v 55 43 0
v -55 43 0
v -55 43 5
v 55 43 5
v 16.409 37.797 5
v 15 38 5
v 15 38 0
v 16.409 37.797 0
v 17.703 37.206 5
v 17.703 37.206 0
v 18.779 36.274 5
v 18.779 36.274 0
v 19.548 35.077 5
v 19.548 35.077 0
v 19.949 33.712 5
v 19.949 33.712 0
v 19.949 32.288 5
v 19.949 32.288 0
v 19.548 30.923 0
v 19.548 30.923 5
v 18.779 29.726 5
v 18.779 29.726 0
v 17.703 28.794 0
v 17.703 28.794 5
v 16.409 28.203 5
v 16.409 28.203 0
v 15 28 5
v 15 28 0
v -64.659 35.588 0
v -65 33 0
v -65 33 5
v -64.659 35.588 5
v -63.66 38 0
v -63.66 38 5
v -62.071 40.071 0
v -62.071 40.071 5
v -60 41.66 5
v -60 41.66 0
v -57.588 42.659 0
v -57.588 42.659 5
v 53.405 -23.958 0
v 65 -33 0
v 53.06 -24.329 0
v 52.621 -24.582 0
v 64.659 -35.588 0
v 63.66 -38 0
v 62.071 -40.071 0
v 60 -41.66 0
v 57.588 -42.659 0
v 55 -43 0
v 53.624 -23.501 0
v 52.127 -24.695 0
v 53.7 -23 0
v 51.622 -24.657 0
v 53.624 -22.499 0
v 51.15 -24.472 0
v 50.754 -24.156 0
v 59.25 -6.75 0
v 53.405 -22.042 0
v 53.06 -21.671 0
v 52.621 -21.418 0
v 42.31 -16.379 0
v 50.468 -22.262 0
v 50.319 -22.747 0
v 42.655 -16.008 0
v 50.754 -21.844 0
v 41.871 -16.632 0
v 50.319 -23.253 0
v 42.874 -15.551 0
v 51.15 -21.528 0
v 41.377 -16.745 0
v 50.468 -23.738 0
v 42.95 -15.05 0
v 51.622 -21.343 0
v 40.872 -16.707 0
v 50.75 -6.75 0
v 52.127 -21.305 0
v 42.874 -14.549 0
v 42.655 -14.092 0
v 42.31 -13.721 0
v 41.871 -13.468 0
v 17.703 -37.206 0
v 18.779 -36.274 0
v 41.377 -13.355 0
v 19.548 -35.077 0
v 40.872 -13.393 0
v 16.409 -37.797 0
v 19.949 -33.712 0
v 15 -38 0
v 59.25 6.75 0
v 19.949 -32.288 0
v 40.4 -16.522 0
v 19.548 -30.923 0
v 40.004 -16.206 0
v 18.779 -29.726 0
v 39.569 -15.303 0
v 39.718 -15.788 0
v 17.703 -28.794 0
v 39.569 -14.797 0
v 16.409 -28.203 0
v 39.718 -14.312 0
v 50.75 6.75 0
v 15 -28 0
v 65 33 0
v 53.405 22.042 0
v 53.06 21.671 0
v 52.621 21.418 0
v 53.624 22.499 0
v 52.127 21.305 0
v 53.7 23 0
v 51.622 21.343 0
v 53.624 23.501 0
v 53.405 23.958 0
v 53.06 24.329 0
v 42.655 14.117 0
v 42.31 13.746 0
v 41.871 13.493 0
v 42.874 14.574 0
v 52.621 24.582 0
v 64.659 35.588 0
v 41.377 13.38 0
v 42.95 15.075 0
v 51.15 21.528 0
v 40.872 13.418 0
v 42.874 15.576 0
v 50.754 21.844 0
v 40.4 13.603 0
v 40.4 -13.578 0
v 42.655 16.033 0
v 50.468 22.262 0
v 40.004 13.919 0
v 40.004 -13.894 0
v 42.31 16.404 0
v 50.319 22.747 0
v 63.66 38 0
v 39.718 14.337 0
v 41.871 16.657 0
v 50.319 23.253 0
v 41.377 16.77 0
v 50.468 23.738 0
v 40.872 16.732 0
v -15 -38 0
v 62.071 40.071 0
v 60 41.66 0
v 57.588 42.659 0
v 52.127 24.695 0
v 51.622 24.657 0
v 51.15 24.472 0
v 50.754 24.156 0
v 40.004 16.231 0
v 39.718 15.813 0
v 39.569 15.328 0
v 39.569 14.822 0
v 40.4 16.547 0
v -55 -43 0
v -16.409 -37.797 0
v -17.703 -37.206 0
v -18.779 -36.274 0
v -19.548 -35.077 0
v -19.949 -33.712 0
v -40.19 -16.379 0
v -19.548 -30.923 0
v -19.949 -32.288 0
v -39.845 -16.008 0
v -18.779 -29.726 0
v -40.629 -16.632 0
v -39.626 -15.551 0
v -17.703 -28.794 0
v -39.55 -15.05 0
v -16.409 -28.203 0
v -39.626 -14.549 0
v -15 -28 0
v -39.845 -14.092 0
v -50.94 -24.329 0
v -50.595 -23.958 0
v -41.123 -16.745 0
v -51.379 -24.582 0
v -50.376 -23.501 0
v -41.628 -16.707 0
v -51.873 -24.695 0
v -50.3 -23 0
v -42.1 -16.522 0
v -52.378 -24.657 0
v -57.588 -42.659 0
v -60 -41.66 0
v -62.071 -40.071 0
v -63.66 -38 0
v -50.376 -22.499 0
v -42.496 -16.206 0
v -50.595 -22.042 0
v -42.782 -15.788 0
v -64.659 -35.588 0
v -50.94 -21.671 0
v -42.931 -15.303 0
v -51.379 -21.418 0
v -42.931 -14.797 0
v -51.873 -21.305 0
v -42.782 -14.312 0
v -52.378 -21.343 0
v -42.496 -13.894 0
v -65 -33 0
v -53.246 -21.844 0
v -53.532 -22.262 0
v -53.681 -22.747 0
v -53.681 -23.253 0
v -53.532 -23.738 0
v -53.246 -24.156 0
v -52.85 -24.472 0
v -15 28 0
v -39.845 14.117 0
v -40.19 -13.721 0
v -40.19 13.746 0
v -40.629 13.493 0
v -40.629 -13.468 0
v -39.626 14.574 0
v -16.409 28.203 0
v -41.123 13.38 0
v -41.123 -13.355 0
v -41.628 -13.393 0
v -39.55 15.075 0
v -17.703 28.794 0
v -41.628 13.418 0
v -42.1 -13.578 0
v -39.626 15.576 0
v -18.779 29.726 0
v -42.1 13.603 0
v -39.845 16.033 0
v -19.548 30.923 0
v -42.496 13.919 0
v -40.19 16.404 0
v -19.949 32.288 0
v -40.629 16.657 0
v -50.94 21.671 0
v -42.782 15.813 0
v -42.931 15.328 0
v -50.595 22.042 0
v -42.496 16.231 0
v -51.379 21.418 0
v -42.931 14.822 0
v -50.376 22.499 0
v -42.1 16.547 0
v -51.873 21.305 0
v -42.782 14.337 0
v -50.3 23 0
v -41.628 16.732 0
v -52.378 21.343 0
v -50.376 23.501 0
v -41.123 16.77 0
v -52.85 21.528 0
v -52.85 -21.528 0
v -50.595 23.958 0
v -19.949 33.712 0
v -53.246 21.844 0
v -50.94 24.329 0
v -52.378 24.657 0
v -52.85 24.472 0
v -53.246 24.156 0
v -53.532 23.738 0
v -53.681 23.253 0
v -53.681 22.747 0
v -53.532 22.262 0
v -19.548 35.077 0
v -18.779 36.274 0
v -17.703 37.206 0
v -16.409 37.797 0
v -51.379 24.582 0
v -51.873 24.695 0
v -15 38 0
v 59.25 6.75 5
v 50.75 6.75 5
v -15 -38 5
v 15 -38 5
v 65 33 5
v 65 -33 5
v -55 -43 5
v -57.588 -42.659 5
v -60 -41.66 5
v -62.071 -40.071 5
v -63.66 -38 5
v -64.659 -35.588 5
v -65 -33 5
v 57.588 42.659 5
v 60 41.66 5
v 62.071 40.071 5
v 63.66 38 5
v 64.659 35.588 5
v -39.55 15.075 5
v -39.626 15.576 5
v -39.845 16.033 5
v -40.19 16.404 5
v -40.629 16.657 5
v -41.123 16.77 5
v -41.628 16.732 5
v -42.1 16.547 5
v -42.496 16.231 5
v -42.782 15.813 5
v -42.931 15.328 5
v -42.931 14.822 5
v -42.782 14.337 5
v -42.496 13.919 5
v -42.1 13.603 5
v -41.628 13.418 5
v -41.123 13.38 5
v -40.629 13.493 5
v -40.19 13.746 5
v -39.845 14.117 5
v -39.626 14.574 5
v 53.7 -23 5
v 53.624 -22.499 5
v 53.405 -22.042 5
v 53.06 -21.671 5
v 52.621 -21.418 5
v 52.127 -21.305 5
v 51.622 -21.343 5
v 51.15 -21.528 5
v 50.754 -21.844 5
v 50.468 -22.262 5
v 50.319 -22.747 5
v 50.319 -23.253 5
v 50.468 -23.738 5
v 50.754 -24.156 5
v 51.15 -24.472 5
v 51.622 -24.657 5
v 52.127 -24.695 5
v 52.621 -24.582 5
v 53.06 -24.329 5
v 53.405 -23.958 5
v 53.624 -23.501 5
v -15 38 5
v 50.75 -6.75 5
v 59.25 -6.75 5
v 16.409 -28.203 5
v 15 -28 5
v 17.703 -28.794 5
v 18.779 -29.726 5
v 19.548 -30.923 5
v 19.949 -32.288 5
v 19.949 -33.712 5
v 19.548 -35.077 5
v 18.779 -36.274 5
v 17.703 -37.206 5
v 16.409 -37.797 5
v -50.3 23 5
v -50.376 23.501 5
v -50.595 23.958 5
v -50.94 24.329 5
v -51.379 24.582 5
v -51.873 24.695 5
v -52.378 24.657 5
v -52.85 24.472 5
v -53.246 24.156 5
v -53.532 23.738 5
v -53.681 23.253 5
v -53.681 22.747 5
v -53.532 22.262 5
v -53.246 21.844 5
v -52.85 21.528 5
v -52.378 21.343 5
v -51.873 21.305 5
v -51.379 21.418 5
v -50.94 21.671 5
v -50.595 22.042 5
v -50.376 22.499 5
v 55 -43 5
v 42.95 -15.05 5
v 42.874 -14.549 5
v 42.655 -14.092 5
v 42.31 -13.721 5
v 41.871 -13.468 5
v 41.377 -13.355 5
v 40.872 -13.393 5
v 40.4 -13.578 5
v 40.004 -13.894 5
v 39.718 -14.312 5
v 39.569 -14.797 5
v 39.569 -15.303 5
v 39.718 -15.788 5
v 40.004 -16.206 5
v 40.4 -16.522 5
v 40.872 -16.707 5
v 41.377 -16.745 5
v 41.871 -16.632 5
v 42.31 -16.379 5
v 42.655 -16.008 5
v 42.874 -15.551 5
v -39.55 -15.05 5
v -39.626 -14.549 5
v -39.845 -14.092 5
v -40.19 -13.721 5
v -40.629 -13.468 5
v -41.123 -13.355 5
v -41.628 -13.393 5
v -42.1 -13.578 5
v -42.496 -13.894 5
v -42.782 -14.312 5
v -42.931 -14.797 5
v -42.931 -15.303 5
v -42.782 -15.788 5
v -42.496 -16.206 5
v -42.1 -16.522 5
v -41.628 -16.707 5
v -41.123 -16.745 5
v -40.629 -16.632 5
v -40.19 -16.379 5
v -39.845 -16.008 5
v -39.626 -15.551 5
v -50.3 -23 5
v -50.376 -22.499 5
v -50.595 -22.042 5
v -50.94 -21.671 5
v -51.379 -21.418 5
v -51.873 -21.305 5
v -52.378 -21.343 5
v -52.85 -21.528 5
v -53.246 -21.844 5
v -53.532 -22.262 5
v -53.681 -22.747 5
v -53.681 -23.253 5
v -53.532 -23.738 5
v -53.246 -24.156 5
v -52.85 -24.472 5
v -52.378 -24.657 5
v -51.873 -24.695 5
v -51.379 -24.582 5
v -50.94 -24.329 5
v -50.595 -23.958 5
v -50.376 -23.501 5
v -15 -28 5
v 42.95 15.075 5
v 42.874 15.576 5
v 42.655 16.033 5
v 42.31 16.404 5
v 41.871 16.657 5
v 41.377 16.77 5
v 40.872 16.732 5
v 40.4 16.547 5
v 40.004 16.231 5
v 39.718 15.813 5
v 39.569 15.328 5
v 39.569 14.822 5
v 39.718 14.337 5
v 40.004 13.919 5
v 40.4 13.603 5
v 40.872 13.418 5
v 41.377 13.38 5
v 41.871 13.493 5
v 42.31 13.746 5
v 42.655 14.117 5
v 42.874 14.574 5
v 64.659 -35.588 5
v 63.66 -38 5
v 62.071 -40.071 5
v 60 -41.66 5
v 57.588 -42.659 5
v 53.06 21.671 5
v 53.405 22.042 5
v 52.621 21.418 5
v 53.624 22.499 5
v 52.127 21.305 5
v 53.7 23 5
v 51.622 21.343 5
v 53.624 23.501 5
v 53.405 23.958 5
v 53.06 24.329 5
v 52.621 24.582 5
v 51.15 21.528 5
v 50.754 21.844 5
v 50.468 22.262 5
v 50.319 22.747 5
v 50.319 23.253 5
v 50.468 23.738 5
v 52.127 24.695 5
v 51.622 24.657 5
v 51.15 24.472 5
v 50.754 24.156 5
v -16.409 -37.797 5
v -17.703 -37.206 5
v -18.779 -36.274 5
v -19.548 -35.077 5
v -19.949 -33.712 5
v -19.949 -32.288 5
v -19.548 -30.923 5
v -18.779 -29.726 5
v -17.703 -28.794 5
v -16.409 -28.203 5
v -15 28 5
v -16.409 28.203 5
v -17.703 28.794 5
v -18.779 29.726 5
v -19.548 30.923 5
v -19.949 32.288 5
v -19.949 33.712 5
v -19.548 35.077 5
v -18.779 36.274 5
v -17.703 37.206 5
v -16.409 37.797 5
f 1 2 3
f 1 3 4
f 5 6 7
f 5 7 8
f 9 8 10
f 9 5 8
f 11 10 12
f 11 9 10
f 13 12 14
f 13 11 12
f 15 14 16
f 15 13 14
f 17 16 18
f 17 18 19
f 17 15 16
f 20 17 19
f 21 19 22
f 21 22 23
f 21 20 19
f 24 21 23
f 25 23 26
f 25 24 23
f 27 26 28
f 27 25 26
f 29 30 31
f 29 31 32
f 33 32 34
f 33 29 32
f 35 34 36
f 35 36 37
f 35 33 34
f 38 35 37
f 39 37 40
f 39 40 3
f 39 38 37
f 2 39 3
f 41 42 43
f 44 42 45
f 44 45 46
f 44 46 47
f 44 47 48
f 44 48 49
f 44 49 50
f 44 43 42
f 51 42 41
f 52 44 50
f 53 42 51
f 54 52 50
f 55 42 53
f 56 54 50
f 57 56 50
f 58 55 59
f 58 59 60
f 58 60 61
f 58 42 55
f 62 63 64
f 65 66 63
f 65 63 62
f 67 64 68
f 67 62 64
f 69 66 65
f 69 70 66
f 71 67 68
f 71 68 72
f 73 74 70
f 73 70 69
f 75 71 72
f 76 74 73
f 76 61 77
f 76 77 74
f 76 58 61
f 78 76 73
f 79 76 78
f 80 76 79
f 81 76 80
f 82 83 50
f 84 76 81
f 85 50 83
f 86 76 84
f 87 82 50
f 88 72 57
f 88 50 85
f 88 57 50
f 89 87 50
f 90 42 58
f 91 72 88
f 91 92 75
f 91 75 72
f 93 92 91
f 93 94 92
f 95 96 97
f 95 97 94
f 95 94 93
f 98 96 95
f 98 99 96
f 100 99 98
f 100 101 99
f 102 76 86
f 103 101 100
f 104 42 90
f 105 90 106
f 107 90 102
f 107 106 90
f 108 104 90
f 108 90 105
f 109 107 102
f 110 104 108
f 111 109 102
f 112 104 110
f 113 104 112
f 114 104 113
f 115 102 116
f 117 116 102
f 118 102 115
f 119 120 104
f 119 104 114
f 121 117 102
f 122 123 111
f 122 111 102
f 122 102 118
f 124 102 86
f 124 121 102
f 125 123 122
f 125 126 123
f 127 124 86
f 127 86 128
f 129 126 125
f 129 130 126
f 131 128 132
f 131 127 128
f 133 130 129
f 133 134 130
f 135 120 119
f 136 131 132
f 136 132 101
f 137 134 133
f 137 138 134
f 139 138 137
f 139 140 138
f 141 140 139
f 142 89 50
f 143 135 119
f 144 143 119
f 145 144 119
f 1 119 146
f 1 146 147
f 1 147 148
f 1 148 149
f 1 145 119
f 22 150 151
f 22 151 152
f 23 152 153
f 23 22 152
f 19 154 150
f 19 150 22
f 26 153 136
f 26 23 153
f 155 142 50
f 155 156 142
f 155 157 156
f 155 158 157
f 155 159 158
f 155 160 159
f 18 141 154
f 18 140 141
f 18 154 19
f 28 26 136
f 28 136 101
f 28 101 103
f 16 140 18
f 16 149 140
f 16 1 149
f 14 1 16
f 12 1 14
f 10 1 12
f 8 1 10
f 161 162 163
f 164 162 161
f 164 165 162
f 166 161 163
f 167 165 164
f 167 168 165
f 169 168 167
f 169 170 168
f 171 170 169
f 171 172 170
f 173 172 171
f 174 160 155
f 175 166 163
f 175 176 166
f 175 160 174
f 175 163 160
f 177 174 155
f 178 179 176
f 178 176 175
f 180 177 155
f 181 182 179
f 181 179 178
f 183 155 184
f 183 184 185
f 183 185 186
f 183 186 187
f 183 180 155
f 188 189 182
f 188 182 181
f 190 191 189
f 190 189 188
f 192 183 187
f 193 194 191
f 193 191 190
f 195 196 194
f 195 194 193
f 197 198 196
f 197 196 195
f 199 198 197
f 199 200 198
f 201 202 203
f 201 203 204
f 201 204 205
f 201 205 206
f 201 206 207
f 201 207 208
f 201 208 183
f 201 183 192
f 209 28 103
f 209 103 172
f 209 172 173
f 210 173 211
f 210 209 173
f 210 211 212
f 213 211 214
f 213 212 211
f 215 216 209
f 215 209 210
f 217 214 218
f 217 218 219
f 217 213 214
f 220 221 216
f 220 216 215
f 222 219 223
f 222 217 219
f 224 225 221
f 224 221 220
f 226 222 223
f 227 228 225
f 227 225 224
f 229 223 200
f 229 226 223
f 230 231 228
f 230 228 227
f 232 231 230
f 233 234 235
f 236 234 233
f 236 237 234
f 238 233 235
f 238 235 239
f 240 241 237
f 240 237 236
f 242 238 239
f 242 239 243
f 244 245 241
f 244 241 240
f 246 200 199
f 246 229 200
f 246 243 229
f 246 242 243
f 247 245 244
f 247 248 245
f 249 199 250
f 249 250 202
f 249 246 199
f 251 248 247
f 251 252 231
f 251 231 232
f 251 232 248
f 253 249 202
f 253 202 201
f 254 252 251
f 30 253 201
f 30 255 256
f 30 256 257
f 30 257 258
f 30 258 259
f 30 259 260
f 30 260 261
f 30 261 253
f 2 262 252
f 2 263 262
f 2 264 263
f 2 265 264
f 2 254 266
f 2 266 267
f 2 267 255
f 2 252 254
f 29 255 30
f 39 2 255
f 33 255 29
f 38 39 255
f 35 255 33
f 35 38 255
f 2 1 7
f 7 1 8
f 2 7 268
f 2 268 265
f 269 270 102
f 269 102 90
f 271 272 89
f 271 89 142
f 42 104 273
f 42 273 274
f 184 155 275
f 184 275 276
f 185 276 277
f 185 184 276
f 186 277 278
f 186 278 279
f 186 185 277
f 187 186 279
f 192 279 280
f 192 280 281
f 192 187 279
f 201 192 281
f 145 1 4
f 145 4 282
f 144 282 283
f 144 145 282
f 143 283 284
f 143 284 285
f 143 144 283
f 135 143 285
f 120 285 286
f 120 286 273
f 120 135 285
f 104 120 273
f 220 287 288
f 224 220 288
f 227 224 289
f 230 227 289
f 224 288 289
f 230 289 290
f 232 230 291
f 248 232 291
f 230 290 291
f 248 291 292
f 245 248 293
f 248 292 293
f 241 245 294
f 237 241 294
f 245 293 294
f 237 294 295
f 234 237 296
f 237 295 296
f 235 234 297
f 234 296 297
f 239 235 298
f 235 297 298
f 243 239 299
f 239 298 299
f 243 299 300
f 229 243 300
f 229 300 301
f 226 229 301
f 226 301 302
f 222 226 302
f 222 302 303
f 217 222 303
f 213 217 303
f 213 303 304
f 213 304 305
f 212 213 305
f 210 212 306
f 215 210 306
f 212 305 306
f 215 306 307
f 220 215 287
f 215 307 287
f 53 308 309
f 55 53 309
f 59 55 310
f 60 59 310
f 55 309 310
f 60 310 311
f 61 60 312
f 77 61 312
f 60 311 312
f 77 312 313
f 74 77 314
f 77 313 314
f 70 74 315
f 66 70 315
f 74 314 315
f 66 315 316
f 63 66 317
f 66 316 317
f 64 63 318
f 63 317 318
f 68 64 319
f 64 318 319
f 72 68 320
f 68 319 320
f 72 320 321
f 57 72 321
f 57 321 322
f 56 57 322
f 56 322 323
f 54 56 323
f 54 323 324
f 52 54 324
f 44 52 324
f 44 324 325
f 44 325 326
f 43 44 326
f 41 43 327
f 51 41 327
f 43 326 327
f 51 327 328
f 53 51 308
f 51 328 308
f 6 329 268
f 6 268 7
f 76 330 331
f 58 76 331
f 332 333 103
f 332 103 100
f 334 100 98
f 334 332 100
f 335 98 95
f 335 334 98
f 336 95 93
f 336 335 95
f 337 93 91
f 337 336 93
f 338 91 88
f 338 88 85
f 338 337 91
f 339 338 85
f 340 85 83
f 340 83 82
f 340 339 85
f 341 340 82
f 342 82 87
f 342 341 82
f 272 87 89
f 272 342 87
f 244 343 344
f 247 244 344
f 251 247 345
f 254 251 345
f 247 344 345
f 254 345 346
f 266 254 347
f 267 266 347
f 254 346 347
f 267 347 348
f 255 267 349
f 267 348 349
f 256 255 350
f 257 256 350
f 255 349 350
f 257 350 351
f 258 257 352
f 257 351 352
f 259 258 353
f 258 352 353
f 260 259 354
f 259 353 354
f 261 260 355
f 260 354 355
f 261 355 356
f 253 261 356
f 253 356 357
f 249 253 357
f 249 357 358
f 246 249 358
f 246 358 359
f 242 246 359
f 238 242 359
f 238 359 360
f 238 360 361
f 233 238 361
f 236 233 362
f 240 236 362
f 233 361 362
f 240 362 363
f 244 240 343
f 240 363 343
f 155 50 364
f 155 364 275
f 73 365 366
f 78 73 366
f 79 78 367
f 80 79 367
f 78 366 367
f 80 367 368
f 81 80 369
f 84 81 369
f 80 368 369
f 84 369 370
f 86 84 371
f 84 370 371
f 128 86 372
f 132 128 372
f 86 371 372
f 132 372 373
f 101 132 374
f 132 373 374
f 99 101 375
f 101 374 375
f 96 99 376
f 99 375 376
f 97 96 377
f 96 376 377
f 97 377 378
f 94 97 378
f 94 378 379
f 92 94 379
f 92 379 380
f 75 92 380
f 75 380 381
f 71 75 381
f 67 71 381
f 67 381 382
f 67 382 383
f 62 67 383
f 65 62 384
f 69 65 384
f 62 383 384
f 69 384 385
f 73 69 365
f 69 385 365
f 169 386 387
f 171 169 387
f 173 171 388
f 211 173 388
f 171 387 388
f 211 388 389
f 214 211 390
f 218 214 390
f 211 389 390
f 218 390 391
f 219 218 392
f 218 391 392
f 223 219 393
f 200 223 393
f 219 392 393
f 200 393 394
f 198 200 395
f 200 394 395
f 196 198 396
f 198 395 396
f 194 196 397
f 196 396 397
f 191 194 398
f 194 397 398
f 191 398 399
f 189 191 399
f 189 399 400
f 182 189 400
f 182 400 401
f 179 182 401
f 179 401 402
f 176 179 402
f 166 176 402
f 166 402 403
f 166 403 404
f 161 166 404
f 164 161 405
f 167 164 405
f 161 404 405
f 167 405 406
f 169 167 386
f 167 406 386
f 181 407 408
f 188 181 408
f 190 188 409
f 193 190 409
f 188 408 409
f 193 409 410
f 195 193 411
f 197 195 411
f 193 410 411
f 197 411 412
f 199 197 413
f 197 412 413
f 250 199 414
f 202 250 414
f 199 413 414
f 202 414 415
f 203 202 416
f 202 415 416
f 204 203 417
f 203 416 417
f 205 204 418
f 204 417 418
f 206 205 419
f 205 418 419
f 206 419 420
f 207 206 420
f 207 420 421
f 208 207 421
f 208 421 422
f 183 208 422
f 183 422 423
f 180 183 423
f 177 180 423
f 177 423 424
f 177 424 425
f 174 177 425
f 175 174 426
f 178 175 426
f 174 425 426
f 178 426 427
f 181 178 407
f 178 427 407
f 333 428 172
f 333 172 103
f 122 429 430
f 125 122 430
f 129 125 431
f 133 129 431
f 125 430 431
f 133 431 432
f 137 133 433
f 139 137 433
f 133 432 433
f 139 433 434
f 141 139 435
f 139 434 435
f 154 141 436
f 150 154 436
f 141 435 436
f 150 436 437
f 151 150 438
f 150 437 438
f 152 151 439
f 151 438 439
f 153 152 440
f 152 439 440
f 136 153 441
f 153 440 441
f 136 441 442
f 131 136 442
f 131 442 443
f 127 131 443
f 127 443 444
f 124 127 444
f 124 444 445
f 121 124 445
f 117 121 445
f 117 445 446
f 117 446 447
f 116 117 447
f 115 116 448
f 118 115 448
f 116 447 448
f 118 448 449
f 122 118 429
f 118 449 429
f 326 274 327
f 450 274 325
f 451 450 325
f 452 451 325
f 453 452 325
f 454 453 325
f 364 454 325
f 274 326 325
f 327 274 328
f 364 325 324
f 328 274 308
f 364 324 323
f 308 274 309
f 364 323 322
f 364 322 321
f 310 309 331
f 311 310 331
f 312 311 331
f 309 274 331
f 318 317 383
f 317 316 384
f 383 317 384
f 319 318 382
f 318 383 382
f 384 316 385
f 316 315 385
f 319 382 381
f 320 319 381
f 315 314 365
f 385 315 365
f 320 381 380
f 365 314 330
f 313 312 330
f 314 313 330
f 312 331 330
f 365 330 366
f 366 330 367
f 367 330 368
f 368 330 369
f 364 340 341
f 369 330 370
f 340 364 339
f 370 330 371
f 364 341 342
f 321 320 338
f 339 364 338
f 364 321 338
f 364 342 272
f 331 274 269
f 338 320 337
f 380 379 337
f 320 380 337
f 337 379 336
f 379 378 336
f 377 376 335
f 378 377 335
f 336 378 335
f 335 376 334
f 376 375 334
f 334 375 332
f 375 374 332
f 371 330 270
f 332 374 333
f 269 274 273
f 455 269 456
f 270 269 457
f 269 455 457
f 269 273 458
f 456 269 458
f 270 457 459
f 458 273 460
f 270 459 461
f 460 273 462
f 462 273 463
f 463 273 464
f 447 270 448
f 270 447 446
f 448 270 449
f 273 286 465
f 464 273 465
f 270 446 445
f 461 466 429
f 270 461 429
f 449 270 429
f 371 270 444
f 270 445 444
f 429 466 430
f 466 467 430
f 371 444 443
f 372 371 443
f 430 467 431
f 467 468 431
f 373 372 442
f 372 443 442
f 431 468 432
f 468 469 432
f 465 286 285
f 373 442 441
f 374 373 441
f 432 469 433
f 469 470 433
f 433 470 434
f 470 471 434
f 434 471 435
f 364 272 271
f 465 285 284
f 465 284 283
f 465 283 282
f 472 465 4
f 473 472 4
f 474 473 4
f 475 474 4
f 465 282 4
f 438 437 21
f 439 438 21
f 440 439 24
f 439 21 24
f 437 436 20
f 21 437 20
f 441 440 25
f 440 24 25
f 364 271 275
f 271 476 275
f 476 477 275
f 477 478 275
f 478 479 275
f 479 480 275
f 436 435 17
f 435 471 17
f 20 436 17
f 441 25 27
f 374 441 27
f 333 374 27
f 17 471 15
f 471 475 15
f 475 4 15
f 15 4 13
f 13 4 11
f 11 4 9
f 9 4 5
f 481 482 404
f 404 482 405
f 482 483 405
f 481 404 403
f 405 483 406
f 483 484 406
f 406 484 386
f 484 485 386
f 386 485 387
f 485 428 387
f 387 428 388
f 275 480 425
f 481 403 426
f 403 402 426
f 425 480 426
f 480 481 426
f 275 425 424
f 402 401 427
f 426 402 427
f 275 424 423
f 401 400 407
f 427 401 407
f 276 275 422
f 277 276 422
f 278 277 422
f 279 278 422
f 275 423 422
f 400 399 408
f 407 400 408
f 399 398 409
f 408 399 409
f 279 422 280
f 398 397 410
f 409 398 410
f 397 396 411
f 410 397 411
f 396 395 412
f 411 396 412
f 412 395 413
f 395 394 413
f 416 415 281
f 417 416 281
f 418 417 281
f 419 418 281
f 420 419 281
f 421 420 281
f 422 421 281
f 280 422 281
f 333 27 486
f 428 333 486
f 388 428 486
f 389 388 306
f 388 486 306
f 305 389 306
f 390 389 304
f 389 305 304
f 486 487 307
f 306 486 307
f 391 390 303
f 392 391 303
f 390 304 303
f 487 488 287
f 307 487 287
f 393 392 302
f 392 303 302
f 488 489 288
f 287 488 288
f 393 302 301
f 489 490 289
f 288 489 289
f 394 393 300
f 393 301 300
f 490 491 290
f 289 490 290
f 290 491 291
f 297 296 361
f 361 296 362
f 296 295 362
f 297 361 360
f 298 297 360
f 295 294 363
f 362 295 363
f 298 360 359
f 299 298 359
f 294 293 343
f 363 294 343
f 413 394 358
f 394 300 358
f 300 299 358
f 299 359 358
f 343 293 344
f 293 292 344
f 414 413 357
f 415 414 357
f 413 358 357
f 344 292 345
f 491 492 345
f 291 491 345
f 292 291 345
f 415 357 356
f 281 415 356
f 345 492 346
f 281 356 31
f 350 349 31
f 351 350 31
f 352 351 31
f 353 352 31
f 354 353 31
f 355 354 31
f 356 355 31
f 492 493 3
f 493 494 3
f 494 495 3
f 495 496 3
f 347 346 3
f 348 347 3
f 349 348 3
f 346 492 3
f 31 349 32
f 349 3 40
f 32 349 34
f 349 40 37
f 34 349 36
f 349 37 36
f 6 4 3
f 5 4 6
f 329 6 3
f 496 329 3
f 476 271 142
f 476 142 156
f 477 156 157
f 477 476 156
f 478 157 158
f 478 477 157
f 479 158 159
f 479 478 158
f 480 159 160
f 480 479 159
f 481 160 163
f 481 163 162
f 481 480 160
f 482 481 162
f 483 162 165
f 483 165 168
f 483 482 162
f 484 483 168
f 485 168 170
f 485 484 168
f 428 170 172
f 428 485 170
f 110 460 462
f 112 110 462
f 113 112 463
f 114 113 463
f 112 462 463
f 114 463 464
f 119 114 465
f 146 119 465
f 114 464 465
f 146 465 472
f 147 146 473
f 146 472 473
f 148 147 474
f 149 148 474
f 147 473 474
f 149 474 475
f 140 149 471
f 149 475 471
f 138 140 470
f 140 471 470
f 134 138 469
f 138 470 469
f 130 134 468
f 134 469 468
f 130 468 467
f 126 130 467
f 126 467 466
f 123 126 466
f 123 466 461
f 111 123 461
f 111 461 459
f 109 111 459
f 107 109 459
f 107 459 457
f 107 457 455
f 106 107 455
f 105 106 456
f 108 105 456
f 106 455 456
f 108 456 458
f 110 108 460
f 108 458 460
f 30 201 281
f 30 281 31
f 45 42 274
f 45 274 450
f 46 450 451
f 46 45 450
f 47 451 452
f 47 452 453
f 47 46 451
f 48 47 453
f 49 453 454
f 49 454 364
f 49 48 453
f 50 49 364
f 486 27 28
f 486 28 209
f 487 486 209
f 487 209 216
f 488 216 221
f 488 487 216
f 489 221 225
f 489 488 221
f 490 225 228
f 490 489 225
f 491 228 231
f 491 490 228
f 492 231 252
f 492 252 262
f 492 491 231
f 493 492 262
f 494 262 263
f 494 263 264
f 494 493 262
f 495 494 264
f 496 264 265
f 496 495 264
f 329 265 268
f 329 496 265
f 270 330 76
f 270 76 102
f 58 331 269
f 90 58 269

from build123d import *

# Parameters (mm, degrees)
BOSS_EXTRUDE1_DEPTH = 5
SKETCH2_R           = 1.7
SKETCH2_W           = 8.5
SKETCH2_H           = 13.5
CUT_EXTRUDE2_DEPTH  = 5


with BuildPart() as part:
    # Sketch1 → Boss-Extrude1 (new body)
    with BuildSketch(Plane.XY):
        with BuildLine():
            Line((-55, 43), (55, 43))
            ThreePointArc((55, 43), (62.071067812, 40.071067812), (65, 33))
            Line((65, 33), (65, -33))
            ThreePointArc((65, -33), (62.071067812, -40.071067812), (55, -43))
            Line((55, -43), (-55, -43))
            ThreePointArc((-55, -43), (-62.071067812, -40.071067812), (-65, -33))
            Line((-65, -33), (-65, 33))
            ThreePointArc((-65, 33), (-62.071067812, 40.071067812), (-55, 43))
        make_face()
    extrude(amount=BOSS_EXTRUDE1_DEPTH)

    # Sketch2 → Cut-Extrude2 (cut)
    with BuildSketch(Plane.XY.offset(5)):
        with Locations((-52, 23)):
            Circle(SKETCH2_R)
        with Locations((-52, -23)):
            Circle(SKETCH2_R)
        with Locations((52, -23)):
            Circle(SKETCH2_R)
        with Locations((52, 23)):
            Circle(SKETCH2_R)
        with Locations((-41.25, -15.05)):
            Circle(SKETCH2_R)
        with Locations((-41.25, 15.075)):
            Circle(SKETCH2_R)
        with Locations((41.25, -15.05)):
            Circle(SKETCH2_R)
        with Locations((41.25, 15.075)):
            Circle(SKETCH2_R)
        with BuildLine():
            Line((-15, -28), (15, -28))
            ThreePointArc((15, -28), (20, -33), (15, -38))
            Line((15, -38), (-15, -38))
            ThreePointArc((-15, -38), (-20, -33), (-15, -28))
        make_face()
        with BuildLine():
            Line((-15, 38), (15, 38))
            ThreePointArc((15, 38), (20, 33), (15, 28))
            Line((15, 28), (-15, 28))
            ThreePointArc((-15, 28), (-20, 33), (-15, 38))
        make_face()
        with Locations((55, 0)):
            Rectangle(SKETCH2_W, SKETCH2_H)
    extrude(amount=-CUT_EXTRUDE2_DEPTH, mode=Mode.SUBTRACT)


solid = part.part
